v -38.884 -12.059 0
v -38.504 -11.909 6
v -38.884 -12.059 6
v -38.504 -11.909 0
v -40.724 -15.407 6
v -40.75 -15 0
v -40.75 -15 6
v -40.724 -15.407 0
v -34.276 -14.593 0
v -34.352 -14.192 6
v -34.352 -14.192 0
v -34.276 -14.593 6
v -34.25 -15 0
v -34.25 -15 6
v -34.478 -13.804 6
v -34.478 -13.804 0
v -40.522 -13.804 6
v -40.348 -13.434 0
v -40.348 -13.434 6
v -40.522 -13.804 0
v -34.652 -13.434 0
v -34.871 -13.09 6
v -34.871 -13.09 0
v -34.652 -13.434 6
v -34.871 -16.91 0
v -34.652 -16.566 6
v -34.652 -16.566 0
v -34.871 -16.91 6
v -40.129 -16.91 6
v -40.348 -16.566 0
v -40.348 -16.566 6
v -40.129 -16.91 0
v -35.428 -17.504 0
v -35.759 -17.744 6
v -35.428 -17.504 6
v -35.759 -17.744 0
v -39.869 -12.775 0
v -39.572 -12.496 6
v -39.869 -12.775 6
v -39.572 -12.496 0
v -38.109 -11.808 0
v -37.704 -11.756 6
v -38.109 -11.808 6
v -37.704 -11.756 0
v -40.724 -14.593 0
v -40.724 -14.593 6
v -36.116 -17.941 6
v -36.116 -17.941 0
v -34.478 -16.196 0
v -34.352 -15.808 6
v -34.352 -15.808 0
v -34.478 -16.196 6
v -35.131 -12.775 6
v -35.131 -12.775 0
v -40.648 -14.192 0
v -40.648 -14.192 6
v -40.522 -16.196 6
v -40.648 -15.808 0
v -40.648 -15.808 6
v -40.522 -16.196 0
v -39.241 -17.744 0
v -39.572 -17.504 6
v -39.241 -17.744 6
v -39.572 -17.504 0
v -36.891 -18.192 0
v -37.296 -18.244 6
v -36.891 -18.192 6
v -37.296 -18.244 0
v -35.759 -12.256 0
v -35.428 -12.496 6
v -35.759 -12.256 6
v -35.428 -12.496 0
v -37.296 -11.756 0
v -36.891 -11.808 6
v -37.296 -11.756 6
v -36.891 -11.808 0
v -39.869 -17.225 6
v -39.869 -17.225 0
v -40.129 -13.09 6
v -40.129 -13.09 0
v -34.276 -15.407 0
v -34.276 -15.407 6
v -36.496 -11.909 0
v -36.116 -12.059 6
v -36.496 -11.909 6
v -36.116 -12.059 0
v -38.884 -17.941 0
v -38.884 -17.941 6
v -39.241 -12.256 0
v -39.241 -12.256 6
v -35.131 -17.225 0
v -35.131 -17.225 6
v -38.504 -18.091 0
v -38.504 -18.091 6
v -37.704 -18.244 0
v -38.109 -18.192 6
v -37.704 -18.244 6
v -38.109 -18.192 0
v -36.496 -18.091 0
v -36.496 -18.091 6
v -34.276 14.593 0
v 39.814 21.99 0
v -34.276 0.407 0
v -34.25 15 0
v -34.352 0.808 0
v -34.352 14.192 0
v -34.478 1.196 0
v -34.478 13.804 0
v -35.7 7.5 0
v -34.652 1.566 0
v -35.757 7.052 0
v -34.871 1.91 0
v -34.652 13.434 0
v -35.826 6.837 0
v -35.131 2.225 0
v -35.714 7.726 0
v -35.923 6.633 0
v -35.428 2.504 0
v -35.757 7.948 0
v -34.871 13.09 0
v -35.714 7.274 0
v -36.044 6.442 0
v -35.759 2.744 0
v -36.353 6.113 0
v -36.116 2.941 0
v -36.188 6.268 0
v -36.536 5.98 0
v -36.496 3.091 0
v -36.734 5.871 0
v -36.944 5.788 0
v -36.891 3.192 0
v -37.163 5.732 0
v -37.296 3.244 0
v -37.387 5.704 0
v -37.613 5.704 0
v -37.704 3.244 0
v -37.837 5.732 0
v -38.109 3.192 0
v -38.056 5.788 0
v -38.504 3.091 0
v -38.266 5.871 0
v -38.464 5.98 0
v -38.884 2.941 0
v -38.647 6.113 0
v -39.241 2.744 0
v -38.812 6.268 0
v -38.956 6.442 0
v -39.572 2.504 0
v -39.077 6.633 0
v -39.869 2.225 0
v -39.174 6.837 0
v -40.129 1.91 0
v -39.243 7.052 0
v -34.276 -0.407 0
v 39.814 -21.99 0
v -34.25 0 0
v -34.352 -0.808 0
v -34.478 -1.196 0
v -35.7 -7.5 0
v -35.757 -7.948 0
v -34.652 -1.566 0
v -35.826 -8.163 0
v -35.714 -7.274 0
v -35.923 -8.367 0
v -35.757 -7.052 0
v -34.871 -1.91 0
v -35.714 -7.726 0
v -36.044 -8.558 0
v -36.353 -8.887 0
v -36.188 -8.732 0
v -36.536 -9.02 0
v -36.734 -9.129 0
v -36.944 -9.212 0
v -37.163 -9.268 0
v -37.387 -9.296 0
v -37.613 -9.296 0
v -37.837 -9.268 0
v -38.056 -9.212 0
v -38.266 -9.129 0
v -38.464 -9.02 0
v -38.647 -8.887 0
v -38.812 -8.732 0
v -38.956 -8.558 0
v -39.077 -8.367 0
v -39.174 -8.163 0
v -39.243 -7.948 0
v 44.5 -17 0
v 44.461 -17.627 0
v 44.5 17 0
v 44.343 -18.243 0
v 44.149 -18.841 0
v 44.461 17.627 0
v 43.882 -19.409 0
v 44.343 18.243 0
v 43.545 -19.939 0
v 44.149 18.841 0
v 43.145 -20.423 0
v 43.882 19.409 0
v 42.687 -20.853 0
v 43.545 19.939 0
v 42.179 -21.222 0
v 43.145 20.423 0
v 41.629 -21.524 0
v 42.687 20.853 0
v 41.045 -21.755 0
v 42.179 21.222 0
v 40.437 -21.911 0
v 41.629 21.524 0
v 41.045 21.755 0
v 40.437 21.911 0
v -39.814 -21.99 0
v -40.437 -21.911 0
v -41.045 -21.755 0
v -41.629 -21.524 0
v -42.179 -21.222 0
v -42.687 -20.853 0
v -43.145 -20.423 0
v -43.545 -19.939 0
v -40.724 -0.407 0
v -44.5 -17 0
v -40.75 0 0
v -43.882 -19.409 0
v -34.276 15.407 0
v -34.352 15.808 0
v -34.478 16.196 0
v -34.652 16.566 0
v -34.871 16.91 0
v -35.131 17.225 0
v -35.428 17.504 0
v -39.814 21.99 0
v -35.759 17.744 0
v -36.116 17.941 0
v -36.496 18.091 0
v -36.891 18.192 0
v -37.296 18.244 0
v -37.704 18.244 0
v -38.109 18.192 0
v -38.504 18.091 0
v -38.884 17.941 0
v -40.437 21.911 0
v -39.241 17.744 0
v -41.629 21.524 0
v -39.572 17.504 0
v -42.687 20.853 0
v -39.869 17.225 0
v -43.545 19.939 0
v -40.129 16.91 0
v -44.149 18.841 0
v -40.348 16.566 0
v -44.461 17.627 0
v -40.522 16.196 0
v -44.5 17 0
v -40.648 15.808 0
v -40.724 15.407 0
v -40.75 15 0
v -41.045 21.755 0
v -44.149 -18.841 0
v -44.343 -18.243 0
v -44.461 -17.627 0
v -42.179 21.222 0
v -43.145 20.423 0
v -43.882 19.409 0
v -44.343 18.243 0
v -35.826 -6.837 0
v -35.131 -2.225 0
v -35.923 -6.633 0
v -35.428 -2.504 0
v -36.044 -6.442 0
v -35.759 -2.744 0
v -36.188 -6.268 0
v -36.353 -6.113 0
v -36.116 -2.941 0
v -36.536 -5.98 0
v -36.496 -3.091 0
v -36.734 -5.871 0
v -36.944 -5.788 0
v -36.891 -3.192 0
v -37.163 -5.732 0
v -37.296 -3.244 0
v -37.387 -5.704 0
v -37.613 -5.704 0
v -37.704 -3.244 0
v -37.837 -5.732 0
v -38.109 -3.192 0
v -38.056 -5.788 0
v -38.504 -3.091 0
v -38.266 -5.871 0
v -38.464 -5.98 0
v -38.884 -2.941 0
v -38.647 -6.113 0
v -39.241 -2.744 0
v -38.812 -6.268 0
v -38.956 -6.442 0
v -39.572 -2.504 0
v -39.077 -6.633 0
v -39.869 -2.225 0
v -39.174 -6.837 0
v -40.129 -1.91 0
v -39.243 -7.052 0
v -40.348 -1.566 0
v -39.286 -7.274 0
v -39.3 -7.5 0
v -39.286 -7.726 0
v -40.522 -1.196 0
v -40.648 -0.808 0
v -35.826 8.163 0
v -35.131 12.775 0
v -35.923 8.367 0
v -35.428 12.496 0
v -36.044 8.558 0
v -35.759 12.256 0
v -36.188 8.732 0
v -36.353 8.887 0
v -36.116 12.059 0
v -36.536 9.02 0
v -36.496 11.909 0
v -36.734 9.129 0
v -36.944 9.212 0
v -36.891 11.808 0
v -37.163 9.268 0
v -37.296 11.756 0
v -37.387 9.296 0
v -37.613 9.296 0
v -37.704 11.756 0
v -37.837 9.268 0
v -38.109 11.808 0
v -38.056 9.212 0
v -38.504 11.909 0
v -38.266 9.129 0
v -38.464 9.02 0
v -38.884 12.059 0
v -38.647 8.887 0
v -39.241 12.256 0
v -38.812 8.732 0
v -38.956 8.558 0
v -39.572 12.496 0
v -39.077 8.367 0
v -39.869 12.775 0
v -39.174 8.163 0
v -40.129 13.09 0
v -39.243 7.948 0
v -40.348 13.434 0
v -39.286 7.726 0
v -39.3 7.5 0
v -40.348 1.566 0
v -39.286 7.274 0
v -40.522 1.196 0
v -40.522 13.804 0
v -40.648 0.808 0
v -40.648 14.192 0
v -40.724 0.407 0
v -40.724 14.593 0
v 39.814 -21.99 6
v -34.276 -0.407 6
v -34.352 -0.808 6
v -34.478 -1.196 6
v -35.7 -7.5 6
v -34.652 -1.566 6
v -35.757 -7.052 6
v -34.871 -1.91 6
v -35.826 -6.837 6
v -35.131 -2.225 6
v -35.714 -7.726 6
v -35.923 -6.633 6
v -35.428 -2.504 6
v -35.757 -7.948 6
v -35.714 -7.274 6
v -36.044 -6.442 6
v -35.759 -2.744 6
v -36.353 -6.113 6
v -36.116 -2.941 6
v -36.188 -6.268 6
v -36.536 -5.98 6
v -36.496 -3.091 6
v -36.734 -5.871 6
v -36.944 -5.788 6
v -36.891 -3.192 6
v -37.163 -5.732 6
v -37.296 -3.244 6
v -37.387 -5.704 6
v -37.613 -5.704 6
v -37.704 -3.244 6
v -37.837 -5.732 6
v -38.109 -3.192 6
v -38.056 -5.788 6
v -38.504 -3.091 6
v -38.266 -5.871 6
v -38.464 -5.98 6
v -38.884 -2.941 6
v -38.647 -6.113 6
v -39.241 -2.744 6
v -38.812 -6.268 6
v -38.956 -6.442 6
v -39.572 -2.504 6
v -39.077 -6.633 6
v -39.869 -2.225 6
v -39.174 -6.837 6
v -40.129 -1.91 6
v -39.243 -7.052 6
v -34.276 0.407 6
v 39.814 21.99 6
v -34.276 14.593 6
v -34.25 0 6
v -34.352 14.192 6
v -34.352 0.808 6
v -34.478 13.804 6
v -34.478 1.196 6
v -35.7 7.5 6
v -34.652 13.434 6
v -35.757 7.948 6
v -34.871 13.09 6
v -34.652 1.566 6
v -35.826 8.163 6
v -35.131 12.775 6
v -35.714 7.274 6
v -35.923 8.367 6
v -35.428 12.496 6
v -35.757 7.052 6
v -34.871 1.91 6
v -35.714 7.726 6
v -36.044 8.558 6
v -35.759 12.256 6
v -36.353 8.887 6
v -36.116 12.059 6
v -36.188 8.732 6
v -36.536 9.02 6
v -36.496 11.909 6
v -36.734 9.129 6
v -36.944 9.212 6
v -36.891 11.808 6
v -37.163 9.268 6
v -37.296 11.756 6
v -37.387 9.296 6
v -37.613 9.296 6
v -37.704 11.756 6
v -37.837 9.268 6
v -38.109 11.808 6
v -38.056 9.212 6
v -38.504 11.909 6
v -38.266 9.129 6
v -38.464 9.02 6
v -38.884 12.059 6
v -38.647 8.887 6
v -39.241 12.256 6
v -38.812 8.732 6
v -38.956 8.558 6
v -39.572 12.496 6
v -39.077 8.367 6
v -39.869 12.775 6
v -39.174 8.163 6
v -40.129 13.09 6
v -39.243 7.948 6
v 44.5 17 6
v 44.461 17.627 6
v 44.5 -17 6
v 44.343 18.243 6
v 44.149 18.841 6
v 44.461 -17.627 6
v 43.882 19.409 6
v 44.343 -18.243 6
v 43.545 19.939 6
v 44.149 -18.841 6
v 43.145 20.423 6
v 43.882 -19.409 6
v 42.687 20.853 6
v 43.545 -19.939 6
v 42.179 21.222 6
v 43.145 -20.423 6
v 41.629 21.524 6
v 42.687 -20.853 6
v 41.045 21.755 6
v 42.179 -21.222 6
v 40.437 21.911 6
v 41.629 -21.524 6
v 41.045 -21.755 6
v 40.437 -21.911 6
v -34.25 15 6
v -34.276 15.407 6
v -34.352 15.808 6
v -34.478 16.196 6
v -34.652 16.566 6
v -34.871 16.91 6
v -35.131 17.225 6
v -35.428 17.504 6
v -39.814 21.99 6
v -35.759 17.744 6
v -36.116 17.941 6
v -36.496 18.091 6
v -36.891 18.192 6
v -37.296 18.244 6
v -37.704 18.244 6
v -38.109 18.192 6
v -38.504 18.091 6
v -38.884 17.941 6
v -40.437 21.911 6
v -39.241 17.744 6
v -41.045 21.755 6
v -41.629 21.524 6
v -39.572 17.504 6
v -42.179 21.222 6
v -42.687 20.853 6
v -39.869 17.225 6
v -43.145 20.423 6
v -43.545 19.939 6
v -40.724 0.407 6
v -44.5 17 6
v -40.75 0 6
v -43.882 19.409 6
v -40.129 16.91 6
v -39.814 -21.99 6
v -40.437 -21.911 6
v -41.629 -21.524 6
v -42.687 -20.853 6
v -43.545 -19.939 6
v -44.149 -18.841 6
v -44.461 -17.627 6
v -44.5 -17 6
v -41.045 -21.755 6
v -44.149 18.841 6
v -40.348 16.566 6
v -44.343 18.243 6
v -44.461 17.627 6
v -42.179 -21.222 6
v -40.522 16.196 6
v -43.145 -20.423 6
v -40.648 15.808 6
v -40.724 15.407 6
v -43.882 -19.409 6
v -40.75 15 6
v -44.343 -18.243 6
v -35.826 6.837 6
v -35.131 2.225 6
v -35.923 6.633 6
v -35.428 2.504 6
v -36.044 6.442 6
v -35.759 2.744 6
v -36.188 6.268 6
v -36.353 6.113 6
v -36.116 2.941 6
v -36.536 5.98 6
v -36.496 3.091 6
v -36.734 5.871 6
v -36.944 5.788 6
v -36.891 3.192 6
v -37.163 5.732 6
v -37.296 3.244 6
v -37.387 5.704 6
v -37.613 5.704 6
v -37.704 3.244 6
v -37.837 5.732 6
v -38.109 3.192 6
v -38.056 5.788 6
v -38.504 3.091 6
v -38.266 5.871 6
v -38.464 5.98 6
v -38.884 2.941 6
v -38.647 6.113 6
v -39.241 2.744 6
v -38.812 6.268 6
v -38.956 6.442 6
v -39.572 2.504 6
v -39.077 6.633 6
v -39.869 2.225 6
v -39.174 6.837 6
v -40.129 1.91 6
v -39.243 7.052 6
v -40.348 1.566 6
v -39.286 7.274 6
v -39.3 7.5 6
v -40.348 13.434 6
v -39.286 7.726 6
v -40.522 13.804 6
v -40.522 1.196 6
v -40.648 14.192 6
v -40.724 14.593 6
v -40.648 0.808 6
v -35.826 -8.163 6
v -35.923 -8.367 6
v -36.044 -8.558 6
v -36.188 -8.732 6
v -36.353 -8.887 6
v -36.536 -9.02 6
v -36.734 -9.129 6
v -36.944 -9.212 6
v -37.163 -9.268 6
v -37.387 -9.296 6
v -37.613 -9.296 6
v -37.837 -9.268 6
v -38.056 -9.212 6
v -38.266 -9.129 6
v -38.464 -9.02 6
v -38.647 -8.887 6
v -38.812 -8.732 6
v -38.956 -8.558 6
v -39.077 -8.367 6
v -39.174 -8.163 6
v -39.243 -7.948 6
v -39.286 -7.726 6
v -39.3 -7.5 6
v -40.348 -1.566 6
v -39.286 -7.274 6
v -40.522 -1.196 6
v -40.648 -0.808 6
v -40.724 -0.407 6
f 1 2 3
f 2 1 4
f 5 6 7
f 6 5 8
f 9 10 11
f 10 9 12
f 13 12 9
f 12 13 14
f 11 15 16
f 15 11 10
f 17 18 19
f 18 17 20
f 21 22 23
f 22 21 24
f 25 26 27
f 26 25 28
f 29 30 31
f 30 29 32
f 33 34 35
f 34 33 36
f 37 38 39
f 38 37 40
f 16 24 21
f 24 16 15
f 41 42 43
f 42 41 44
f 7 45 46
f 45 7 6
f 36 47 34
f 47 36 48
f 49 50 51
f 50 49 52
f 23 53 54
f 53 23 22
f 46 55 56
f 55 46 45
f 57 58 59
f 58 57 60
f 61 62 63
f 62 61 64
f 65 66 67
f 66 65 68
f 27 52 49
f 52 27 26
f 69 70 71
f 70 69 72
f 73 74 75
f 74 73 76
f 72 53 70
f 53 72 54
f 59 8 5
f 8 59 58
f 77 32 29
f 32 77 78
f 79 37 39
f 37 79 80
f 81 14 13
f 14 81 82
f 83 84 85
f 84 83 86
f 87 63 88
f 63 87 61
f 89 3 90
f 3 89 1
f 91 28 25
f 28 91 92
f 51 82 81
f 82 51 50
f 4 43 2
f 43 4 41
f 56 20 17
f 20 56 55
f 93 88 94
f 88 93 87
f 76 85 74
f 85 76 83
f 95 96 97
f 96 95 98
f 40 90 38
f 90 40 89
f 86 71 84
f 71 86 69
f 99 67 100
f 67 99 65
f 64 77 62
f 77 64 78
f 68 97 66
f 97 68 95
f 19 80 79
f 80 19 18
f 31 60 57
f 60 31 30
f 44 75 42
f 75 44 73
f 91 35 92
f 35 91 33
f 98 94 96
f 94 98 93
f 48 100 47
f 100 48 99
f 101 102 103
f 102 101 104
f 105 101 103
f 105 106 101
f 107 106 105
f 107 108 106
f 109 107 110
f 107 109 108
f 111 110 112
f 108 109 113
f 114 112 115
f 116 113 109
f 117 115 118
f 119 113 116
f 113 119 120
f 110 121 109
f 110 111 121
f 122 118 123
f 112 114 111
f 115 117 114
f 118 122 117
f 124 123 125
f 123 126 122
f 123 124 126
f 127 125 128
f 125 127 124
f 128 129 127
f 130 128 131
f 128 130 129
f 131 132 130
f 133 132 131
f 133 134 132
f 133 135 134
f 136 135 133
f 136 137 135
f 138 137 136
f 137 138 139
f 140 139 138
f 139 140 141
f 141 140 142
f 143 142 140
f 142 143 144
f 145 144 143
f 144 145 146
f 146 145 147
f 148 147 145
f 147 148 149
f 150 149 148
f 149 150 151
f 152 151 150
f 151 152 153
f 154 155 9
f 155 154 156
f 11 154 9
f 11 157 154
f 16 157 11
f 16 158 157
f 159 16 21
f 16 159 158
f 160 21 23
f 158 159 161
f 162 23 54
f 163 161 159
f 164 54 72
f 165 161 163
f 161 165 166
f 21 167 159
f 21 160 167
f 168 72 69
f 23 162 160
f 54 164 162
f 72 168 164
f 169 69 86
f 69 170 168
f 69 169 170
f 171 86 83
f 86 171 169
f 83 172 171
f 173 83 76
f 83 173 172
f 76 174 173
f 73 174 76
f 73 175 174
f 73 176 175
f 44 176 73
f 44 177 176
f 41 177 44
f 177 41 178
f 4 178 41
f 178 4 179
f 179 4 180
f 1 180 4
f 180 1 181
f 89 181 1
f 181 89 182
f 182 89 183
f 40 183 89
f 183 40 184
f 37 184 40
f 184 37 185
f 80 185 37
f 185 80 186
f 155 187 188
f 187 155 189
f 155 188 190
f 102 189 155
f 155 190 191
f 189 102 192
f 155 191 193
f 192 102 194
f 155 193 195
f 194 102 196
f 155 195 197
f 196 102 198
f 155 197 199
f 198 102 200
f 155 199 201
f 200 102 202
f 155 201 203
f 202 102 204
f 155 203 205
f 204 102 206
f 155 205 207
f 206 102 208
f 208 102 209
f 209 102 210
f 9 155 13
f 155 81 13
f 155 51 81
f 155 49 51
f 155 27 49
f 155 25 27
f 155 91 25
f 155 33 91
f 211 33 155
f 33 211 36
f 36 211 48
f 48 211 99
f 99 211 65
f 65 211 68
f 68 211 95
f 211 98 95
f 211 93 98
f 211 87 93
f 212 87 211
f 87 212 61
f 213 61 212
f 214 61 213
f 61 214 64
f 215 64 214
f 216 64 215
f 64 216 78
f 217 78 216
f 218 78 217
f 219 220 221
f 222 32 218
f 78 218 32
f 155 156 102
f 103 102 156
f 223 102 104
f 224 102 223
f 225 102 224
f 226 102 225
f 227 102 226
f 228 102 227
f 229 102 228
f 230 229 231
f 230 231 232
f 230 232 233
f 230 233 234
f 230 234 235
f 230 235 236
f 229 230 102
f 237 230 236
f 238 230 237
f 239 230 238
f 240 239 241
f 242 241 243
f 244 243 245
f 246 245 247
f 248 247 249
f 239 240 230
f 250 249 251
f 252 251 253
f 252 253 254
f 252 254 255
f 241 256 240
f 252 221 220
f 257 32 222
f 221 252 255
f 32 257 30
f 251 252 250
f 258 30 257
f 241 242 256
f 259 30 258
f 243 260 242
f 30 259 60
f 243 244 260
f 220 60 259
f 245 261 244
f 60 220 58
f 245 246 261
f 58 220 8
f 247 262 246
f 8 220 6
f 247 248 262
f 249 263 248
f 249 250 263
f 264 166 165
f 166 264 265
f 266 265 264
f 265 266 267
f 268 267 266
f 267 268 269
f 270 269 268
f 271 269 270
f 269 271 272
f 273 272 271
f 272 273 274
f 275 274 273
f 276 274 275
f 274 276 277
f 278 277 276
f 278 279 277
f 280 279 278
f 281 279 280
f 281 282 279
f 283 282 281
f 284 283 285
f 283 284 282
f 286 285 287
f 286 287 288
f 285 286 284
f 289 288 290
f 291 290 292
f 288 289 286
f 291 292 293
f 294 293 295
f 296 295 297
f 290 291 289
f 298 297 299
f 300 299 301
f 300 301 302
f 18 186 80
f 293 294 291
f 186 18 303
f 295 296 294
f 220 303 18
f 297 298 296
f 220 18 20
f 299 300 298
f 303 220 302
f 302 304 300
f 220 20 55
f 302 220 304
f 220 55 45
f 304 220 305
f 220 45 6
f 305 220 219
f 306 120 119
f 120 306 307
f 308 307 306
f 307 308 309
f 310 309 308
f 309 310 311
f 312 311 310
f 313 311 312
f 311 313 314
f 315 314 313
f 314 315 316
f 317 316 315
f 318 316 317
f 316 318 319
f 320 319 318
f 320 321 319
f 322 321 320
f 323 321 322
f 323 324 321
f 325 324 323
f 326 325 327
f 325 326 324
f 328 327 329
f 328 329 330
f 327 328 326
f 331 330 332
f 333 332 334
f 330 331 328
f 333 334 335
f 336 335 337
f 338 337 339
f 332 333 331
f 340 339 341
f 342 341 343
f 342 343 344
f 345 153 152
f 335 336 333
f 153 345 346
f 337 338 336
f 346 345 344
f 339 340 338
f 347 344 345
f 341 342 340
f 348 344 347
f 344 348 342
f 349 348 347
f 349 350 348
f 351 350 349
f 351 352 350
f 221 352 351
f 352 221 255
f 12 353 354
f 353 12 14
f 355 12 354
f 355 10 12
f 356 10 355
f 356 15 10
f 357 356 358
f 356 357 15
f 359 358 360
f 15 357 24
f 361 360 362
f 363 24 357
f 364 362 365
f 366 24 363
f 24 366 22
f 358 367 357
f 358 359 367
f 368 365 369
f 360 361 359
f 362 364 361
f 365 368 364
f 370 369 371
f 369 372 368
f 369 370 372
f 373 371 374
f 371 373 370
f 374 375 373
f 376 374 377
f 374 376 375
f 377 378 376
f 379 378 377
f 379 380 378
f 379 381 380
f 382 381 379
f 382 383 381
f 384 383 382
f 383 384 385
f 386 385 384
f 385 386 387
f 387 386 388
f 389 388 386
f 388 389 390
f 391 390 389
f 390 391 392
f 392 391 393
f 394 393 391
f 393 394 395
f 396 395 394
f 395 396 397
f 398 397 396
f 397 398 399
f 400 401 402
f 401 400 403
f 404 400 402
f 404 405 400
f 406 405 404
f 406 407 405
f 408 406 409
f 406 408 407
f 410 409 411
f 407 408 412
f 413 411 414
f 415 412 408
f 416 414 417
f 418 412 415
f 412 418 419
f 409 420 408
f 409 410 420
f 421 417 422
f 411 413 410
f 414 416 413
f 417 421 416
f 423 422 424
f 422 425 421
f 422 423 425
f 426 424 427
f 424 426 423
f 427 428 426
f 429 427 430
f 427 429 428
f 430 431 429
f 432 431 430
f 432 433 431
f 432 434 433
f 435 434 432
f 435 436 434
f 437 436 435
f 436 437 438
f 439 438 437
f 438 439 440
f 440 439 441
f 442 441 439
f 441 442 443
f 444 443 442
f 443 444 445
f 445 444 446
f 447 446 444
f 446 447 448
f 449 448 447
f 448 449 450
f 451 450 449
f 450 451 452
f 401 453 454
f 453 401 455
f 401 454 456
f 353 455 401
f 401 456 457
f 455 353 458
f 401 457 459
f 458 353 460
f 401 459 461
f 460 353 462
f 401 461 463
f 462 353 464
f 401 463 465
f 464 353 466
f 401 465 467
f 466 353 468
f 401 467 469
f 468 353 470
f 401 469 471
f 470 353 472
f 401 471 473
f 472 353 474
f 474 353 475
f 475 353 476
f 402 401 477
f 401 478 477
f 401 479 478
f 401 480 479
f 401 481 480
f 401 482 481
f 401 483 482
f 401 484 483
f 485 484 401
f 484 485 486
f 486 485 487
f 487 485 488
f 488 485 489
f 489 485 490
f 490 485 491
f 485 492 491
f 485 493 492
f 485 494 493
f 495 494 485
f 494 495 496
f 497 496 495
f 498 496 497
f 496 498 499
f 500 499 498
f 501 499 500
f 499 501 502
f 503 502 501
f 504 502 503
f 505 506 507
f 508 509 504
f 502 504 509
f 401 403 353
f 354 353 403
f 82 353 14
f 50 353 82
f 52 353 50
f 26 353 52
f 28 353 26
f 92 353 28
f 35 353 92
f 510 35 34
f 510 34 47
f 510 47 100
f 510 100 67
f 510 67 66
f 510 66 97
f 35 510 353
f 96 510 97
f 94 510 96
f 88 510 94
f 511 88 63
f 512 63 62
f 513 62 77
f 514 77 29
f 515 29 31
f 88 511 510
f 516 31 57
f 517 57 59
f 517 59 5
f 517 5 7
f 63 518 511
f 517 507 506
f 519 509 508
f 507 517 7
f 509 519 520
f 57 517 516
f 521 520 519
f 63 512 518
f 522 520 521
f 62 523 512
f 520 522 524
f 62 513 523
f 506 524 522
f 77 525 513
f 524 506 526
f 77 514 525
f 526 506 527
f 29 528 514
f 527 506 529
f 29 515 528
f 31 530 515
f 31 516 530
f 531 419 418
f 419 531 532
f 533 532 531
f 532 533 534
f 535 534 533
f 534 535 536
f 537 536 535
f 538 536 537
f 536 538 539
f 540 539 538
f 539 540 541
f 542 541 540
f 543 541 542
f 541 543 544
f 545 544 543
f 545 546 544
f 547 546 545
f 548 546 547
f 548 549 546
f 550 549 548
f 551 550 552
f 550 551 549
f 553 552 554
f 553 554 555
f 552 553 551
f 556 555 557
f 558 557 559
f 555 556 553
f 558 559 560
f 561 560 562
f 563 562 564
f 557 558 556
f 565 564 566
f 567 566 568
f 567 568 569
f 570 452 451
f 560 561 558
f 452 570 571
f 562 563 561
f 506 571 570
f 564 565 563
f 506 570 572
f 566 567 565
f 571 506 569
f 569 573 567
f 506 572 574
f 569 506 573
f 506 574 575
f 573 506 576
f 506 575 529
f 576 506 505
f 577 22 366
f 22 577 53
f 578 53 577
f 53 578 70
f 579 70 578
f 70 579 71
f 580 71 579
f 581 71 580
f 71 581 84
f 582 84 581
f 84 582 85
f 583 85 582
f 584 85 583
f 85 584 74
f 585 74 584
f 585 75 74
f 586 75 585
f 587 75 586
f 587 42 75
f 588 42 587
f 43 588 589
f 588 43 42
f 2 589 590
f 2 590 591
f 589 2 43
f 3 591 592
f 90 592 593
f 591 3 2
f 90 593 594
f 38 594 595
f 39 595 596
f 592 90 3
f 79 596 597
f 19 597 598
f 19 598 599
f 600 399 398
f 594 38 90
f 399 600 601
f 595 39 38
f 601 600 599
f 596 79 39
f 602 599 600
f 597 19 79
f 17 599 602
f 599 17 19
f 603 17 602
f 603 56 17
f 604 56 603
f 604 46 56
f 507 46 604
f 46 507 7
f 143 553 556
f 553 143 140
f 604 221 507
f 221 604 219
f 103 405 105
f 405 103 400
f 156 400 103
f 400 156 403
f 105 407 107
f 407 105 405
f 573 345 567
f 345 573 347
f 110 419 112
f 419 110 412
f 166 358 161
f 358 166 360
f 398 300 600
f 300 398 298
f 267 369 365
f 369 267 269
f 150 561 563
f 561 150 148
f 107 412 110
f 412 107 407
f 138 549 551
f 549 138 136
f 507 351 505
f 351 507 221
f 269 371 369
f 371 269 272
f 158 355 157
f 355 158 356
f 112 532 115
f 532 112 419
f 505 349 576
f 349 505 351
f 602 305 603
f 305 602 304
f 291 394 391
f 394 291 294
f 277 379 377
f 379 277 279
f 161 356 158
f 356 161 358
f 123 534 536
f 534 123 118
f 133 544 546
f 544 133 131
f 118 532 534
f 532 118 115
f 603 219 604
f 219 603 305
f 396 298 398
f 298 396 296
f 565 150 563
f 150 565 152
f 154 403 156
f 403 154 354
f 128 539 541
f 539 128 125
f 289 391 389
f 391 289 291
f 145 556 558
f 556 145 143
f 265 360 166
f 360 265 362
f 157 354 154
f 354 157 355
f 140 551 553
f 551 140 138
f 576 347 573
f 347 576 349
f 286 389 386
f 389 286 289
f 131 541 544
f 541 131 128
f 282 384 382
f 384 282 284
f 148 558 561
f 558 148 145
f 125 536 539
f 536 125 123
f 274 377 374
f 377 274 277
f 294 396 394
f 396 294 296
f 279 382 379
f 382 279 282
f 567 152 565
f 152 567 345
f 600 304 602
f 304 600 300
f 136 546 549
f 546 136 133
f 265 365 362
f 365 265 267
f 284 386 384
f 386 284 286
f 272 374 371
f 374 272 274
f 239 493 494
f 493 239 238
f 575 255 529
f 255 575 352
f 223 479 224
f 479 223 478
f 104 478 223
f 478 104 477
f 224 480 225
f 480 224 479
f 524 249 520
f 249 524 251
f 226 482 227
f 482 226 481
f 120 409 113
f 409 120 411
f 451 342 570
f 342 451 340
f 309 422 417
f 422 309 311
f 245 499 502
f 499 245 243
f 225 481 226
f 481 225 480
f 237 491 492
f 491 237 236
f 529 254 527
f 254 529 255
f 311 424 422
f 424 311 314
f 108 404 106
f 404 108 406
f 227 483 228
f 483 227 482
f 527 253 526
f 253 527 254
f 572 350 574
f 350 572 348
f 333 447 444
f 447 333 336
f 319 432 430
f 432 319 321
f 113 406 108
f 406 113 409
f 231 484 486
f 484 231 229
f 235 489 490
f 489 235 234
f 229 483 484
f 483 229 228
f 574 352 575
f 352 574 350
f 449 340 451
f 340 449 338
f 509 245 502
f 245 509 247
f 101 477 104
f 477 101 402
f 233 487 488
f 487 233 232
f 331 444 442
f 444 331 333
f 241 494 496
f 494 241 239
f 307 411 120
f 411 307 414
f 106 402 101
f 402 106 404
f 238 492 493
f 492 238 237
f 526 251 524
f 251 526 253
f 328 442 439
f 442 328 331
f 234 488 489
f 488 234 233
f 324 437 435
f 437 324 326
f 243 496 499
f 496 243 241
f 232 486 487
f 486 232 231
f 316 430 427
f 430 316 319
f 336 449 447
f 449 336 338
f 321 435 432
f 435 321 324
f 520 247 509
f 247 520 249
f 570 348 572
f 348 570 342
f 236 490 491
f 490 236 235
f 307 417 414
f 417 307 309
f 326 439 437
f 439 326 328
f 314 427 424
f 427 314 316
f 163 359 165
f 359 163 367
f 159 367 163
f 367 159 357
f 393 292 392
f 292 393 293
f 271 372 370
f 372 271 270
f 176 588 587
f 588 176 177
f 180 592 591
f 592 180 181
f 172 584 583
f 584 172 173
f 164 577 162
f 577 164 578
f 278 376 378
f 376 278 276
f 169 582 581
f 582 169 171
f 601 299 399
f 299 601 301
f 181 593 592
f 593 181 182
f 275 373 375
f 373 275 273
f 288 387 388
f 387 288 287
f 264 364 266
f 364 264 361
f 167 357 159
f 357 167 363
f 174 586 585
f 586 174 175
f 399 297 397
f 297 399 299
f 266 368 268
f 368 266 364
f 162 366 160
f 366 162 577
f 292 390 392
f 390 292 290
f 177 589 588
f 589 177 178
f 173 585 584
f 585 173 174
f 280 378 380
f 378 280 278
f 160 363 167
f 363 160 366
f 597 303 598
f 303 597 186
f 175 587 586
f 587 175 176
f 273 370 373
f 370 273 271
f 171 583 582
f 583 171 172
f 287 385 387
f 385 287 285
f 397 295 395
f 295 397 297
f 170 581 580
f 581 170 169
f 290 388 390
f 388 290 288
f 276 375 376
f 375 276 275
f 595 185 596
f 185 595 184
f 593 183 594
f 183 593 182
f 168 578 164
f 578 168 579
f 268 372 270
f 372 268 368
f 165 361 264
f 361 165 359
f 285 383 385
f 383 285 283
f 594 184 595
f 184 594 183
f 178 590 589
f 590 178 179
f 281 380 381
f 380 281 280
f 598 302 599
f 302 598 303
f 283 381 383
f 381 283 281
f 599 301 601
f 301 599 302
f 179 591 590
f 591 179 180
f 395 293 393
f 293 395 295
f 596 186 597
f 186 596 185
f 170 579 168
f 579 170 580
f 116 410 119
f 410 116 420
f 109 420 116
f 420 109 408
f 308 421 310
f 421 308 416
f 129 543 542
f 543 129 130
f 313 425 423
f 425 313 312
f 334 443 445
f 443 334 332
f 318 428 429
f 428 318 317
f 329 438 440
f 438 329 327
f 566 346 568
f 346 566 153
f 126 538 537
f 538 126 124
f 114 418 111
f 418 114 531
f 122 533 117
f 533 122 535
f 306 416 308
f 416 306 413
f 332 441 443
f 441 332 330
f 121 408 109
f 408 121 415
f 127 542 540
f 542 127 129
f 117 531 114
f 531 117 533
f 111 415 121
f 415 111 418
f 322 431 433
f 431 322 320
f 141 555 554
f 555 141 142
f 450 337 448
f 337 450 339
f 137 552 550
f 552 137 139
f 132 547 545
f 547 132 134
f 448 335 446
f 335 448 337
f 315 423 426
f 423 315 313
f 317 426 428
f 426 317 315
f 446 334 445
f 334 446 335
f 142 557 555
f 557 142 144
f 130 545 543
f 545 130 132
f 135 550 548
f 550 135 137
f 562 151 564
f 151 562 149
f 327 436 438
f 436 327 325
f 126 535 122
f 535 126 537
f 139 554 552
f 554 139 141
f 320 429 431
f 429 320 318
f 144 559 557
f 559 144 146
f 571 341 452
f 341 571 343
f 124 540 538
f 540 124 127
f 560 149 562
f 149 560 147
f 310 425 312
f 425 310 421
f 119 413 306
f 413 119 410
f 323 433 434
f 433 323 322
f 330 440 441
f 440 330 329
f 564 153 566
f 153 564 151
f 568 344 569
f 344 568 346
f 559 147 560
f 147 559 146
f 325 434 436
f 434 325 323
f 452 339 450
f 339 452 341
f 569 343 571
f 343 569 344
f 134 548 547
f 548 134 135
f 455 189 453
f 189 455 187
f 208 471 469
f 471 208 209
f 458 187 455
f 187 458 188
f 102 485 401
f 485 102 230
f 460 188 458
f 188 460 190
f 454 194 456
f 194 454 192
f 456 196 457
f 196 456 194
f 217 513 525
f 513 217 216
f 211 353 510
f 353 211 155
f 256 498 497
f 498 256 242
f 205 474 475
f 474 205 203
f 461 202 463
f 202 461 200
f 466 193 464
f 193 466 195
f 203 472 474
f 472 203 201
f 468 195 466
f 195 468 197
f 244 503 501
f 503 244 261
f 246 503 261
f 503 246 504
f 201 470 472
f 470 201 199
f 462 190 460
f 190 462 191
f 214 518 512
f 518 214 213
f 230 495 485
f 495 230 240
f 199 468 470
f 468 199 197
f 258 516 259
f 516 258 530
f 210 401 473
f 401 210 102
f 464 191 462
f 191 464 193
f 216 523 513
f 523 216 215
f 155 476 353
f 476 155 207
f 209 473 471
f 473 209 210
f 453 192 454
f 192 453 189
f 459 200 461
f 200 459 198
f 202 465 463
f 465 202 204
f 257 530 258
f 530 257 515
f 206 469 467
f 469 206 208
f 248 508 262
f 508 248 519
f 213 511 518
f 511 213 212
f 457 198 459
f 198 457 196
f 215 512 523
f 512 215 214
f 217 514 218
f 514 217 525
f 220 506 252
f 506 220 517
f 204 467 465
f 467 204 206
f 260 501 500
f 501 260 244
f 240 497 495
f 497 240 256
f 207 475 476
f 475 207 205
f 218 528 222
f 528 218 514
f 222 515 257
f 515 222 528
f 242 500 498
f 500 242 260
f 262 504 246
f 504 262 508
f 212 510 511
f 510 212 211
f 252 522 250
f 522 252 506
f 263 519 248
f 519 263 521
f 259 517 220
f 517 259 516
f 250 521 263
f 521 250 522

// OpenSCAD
$fn = 50;


difference() {
	union() {
		hull() {
			translate(v = [-39.5000000000, 17.0000000000, 0]) {
				cylinder(h = 6, r = 5);
			}
			translate(v = [39.5000000000, 17.0000000000, 0]) {
				cylinder(h = 6, r = 5);
			}
			translate(v = [-39.5000000000, -17.0000000000, 0]) {
				cylinder(h = 6, r = 5);
			}
			translate(v = [39.5000000000, -17.0000000000, 0]) {
				cylinder(h = 6, r = 5);
			}
		}
	}
	union() {
		translate(v = [-37.5000000000, -15.0000000000, 0]) {
			cylinder(h = 6, r = 3.2500000000);
		}
		translate(v = [-37.5000000000, 0.0000000000, 0]) {
			cylinder(h = 6, r = 3.2500000000);
		}
		translate(v = [-37.5000000000, 15.0000000000, 0]) {
			cylinder(h = 6, r = 3.2500000000);
		}
		translate(v = [-37.5000000000, -15.0000000000, 0]) {
			cylinder(h = 6, r = 1.8000000000);
		}
		translate(v = [-37.5000000000, -7.5000000000, 0]) {
			cylinder(h = 6, r = 1.8000000000);
		}
		translate(v = [-37.5000000000, 0.0000000000, 0]) {
			cylinder(h = 6, r = 1.8000000000);
		}
		translate(v = [-37.5000000000, 7.5000000000, 0]) {
			cylinder(h = 6, r = 1.8000000000);
		}
		translate(v = [-37.5000000000, 15.0000000000, 0]) {
			cylinder(h = 6, r = 1.8000000000);
		}
		translate(v = [-37.5000000000, -15.0000000000, 0]) {
			cylinder(h = 6, r = 1.8000000000);
		}
		translate(v = [-37.5000000000, -7.5000000000, 0]) {
			cylinder(h = 6, r = 1.8000000000);
		}
		translate(v = [-37.5000000000, 0.0000000000, 0]) {
			cylinder(h = 6, r = 1.8000000000);
		}
		translate(v = [-37.5000000000, 7.5000000000, 0]) {
			cylinder(h = 6, r = 1.8000000000);
		}
		translate(v = [-37.5000000000, 15.0000000000, 0]) {
			cylinder(h = 6, r = 1.8000000000);
		}
		translate(v = [-37.5000000000, -15.0000000000, 0]) {
			cylinder(h = 6, r = 1.8000000000);
		}
		translate(v = [-37.5000000000, -7.5000000000, 0]) {
			cylinder(h = 6, r = 1.8000000000);
		}
		translate(v = [-37.5000000000, 0.0000000000, 0]) {
			cylinder(h = 6, r = 1.8000000000);
		}
		translate(v = [-37.5000000000, 7.5000000000, 0]) {
			cylinder(h = 6, r = 1.8000000000);
		}
		translate(v = [-37.5000000000, 15.0000000000, 0]) {
			cylinder(h = 6, r = 1.8000000000);
		}
	}
}
